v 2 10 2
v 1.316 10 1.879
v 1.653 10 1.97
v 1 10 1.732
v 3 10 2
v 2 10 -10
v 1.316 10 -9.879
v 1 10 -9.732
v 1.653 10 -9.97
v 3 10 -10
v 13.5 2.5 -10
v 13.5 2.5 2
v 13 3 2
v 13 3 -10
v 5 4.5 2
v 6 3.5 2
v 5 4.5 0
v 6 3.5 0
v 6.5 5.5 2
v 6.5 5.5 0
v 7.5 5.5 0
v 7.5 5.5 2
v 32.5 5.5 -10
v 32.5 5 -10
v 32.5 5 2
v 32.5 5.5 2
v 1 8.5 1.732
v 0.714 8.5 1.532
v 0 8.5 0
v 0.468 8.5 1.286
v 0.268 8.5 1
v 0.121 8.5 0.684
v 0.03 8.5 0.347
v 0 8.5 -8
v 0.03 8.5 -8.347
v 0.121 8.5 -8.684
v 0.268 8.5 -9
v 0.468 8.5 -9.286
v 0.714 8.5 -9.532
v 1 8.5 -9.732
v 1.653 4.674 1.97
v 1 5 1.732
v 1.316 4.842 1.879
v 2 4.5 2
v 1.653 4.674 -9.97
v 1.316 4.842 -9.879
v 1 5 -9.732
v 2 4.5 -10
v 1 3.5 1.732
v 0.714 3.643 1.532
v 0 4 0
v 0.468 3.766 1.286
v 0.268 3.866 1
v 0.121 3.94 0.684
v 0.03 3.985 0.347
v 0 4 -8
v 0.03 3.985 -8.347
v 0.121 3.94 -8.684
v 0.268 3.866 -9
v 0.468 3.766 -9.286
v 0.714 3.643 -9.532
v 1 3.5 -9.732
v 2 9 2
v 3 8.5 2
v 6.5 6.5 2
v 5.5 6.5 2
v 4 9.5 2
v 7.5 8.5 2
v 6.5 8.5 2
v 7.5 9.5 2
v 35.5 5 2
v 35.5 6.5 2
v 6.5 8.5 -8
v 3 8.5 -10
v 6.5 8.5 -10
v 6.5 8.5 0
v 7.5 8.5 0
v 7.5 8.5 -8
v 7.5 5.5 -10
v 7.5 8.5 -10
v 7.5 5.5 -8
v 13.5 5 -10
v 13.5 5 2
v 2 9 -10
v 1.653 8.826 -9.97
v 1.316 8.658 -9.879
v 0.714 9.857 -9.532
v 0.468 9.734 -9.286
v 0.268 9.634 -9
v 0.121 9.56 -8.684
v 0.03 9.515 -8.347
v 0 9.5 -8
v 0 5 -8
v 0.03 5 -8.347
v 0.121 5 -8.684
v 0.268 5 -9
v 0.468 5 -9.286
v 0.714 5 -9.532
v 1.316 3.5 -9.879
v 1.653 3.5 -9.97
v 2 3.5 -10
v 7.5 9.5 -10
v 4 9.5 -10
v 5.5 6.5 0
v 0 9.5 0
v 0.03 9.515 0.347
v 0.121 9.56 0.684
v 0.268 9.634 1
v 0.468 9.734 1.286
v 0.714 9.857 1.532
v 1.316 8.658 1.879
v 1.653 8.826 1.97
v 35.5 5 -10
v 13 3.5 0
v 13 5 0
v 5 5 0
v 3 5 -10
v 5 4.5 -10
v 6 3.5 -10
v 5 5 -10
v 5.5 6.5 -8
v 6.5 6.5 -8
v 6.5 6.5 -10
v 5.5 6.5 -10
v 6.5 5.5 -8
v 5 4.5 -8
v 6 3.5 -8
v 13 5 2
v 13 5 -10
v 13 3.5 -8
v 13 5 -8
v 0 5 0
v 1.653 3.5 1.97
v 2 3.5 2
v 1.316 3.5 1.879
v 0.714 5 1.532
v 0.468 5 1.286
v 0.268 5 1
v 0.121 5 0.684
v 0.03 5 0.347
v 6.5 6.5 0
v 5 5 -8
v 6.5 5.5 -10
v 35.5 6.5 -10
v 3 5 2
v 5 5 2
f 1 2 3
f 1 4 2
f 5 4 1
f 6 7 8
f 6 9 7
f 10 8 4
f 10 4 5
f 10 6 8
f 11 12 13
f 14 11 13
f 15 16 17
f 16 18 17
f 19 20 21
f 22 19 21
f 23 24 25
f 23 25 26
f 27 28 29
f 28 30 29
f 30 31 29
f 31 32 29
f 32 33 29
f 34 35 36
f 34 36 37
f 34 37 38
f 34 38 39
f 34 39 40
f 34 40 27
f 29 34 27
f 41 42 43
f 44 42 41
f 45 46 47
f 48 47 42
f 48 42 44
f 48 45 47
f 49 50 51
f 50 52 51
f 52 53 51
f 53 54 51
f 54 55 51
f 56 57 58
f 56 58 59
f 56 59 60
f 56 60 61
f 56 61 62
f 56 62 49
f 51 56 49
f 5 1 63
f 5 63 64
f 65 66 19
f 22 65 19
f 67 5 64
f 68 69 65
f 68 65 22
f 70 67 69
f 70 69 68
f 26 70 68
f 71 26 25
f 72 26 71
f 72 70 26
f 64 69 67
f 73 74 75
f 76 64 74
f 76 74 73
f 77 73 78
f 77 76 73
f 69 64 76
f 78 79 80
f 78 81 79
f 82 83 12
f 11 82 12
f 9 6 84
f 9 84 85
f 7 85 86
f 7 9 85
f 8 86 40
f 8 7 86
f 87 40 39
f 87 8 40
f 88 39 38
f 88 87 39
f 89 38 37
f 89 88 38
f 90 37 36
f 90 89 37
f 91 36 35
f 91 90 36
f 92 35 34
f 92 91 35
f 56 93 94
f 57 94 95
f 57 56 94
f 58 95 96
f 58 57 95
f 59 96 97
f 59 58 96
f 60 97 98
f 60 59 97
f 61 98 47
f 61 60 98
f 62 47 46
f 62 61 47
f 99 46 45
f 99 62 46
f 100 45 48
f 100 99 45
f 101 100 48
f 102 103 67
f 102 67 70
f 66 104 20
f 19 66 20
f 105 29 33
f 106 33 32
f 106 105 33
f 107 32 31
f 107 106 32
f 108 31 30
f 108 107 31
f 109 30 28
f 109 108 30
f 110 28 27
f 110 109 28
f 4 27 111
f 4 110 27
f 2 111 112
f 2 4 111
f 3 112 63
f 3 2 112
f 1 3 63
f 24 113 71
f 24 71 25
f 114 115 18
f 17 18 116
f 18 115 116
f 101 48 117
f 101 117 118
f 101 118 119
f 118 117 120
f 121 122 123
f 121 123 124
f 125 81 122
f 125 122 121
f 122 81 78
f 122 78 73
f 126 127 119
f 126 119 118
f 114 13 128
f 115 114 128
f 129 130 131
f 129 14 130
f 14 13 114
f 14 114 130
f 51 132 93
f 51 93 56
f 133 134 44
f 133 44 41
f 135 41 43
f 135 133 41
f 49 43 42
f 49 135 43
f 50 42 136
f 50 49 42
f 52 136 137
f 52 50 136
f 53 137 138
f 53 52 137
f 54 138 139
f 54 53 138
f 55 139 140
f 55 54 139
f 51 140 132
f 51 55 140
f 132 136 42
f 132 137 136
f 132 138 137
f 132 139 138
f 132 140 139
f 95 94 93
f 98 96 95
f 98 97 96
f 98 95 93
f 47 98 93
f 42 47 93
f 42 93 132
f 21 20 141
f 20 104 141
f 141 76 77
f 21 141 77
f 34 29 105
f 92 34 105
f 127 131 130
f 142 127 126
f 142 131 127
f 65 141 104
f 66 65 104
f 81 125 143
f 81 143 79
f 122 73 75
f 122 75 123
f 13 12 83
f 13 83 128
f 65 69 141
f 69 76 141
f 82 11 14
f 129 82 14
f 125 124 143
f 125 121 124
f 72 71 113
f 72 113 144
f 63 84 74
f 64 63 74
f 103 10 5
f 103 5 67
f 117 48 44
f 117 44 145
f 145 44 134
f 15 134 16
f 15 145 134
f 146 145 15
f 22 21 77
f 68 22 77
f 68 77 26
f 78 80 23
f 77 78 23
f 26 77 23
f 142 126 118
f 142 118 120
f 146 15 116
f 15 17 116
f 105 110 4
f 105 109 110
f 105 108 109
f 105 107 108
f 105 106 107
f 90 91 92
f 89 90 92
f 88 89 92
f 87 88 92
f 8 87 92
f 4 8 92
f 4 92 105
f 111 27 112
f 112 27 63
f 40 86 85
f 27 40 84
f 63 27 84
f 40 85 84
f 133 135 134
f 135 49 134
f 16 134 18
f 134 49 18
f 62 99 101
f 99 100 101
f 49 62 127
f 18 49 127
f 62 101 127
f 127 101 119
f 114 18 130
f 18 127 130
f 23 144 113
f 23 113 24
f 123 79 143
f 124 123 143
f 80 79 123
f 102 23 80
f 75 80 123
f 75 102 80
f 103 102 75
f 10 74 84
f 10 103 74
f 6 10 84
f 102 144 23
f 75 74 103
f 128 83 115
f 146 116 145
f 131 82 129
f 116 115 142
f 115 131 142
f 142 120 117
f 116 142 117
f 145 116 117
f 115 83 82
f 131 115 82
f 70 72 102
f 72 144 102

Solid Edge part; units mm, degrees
sketch "Sketch1" plane through (0, 0, 0) normal (0, 0, 1) x (1, 0, 0)
  line L0 (7.5, 8.5) -> (32.5, 5.5)
  line L1 (32.5, 5) -> (32.5, 5.5)
  line L2 (35.5, 5) -> (32.5, 5)
  line L3 (35.5, 5) -> (35.5, 6.5)
  line L4 (35.5, 6.5) -> (7.5, 9.5)
  line L5 (4, 9.5) -> (7.5, 9.5)
  line L6 (3, 10) -> (4, 9.5)
  line L7 (1, 10) -> (3, 10)
  line L8 (0, 9.5) -> (1, 10)
  line L9 (0, 8.5) -> (0, 9.5)
  line L10 (0, 8.5) -> (1, 8.5)
  line L11 (1, 8.5) -> (2, 9)
  line L12 (2, 9) -> (3, 8.5)
  line L13 (3, 8.5) -> (6.5, 8.5)
  line L14 (6.5, 8.5) -> (6.5, 6.5)
  line L15 (6.5, 6.5) -> (5.5, 6.5)
  line L16 (5.5, 6.5) -> (6.5, 5.5)
  line L17 (6.5, 5.5) -> (7.5, 5.5)
  line L18 (7.5, 5.5) -> (7.5, 8.5)
  line L19 (5, 5) -> (4, 5)
  line L20 (3, 5) -> (4, 5)
  line L21 (2, 4.5) -> (3, 5)
  line L22 (1, 5) -> (2, 4.5)
  line L23 (0, 5) -> (1, 5)
  line L24 (0, 5) -> (0, 4)
  line L25 (0, 4) -> (1, 3.5)
  line L26 (1, 3.5) -> (4, 3.5)
  line L27 (4, 3.5) -> (6, 3.5)
  line L28 (6, 3.5) -> (5, 4.5)
  line L29 (5, 4.5) -> (5, 5)
  line L30 (13.5, 5) -> (13.5, 2.5)
  line L31 (13.5, 2.5) -> (13, 3)
  line L32 (13, 3) -> (13, 5)
  line L33 (13, 5) -> (13.5, 5)
extrude "Protrusion1" add sketch "Sketch1" along normal blind 2
sketch "Sketch2" plane through (0, 0, 0) normal (0, 0, 1) x (1, 0, 0)
  line L0 (13.5, 5) -> (13.5, 2.5)
  line L1 (13.5, 2.5) -> (13, 3)
  line L2 (13, 3.5) -> (13, 3)
  line L3 (6, 3.5) -> (13, 3.5)
  line L4 (4, 3.5) -> (6, 3.5)
  line L5 (1, 3.5) -> (4, 3.5)
  line L6 (0, 4) -> (1, 3.5)
  line L7 (0, 5) -> (0, 4)
  line L8 (0, 5) -> (1, 5)
  line L9 (1, 5) -> (2, 4.5)
  line L10 (2, 4.5) -> (3, 5)
  line L11 (3, 5) -> (4, 5)
  line L12 (5, 5) -> (4, 5)
  line L13 (5, 5) -> (13, 5)
  line L14 (13, 5) -> (13.5, 5)
  line L15 (7.5, 8.5) -> (32.5, 5.5)
  line L16 (32.5, 5) -> (32.5, 5.5)
  line L17 (35.5, 5) -> (32.5, 5)
  line L18 (35.5, 5) -> (35.5, 6.5)
  line L19 (35.5, 6.5) -> (7.5, 9.5)
  line L20 (4, 9.5) -> (7.5, 9.5)
  line L21 (3, 10) -> (4, 9.5)
  line L22 (1, 10) -> (3, 10)
  line L23 (0, 9.5) -> (1, 10)
  line L24 (0, 8.5) -> (0, 9.5)
  line L25 (0, 8.5) -> (1, 8.5)
  line L26 (1, 8.5) -> (2, 9)
  line L27 (2, 9) -> (3, 8.5)
  line L28 (3, 8.5) -> (6.5, 8.5)
  line L29 (6.5, 8.5) -> (7.5, 8.5)
  dimension "D1" = 22
extrude "Protrusion2" add sketch "Sketch2" against normal blind 8
sketch "Sketch3" plane through (0, 0, -8) normal (0, 0, 1) x (1, 0, 0)
  line L0 (5, 4.5) -> (5, 5)
  line L1 (5, 5) -> (4, 5)
  line L2 (3, 5) -> (4, 5)
  line L3 (2, 4.5) -> (3, 5)
  line L4 (1, 5) -> (2, 4.5)
  line L5 (0, 5) -> (1, 5)
  line L6 (0, 5) -> (0, 4)
  line L7 (0, 4) -> (1, 3.5)
  line L8 (1, 3.5) -> (4, 3.5)
  line L9 (4, 3.5) -> (6, 3.5)
  line L10 (6, 3.5) -> (5, 4.5)
  line L11 (13, 3) -> (13, 5)
  line L12 (13, 5) -> (13.5, 5)
  line L13 (13.5, 5) -> (13.5, 2.5)
  line L14 (13.5, 2.5) -> (13, 3)
  line L15 (4, 9.5) -> (7.5, 9.5)
  line L16 (35.5, 6.5) -> (7.5, 9.5)
  line L17 (35.5, 5) -> (35.5, 6.5)
  line L18 (35.5, 5) -> (32.5, 5)
  line L19 (32.5, 5) -> (32.5, 5.5)
  line L20 (7.5, 8.5) -> (32.5, 5.5)
  line L21 (7.5, 5.5) -> (7.5, 8.5)
  line L22 (6.5, 5.5) -> (7.5, 5.5)
  line L23 (5.5, 6.5) -> (6.5, 5.5)
  line L24 (6.5, 6.5) -> (5.5, 6.5)
  line L25 (6.5, 8.5) -> (6.5, 6.5)
  line L26 (3, 8.5) -> (6.5, 8.5)
  line L27 (2, 9) -> (3, 8.5)
  line L28 (1, 8.5) -> (2, 9)
  line L29 (0, 8.5) -> (1, 8.5)
  line L30 (0, 8.5) -> (0, 9.5)
  line L31 (0, 9.5) -> (1, 10)
  line L32 (1, 10) -> (3, 10)
  line L33 (3, 10) -> (4, 9.5)
extrude "SecondExtrusion" add sketch "Sketch3" against normal blind 2
fillet "Round_2" radius 2 4 edges at (0, 9, 2) (0, 4.5, 2) (0, 9, -10) (0, 4.5, -10)
